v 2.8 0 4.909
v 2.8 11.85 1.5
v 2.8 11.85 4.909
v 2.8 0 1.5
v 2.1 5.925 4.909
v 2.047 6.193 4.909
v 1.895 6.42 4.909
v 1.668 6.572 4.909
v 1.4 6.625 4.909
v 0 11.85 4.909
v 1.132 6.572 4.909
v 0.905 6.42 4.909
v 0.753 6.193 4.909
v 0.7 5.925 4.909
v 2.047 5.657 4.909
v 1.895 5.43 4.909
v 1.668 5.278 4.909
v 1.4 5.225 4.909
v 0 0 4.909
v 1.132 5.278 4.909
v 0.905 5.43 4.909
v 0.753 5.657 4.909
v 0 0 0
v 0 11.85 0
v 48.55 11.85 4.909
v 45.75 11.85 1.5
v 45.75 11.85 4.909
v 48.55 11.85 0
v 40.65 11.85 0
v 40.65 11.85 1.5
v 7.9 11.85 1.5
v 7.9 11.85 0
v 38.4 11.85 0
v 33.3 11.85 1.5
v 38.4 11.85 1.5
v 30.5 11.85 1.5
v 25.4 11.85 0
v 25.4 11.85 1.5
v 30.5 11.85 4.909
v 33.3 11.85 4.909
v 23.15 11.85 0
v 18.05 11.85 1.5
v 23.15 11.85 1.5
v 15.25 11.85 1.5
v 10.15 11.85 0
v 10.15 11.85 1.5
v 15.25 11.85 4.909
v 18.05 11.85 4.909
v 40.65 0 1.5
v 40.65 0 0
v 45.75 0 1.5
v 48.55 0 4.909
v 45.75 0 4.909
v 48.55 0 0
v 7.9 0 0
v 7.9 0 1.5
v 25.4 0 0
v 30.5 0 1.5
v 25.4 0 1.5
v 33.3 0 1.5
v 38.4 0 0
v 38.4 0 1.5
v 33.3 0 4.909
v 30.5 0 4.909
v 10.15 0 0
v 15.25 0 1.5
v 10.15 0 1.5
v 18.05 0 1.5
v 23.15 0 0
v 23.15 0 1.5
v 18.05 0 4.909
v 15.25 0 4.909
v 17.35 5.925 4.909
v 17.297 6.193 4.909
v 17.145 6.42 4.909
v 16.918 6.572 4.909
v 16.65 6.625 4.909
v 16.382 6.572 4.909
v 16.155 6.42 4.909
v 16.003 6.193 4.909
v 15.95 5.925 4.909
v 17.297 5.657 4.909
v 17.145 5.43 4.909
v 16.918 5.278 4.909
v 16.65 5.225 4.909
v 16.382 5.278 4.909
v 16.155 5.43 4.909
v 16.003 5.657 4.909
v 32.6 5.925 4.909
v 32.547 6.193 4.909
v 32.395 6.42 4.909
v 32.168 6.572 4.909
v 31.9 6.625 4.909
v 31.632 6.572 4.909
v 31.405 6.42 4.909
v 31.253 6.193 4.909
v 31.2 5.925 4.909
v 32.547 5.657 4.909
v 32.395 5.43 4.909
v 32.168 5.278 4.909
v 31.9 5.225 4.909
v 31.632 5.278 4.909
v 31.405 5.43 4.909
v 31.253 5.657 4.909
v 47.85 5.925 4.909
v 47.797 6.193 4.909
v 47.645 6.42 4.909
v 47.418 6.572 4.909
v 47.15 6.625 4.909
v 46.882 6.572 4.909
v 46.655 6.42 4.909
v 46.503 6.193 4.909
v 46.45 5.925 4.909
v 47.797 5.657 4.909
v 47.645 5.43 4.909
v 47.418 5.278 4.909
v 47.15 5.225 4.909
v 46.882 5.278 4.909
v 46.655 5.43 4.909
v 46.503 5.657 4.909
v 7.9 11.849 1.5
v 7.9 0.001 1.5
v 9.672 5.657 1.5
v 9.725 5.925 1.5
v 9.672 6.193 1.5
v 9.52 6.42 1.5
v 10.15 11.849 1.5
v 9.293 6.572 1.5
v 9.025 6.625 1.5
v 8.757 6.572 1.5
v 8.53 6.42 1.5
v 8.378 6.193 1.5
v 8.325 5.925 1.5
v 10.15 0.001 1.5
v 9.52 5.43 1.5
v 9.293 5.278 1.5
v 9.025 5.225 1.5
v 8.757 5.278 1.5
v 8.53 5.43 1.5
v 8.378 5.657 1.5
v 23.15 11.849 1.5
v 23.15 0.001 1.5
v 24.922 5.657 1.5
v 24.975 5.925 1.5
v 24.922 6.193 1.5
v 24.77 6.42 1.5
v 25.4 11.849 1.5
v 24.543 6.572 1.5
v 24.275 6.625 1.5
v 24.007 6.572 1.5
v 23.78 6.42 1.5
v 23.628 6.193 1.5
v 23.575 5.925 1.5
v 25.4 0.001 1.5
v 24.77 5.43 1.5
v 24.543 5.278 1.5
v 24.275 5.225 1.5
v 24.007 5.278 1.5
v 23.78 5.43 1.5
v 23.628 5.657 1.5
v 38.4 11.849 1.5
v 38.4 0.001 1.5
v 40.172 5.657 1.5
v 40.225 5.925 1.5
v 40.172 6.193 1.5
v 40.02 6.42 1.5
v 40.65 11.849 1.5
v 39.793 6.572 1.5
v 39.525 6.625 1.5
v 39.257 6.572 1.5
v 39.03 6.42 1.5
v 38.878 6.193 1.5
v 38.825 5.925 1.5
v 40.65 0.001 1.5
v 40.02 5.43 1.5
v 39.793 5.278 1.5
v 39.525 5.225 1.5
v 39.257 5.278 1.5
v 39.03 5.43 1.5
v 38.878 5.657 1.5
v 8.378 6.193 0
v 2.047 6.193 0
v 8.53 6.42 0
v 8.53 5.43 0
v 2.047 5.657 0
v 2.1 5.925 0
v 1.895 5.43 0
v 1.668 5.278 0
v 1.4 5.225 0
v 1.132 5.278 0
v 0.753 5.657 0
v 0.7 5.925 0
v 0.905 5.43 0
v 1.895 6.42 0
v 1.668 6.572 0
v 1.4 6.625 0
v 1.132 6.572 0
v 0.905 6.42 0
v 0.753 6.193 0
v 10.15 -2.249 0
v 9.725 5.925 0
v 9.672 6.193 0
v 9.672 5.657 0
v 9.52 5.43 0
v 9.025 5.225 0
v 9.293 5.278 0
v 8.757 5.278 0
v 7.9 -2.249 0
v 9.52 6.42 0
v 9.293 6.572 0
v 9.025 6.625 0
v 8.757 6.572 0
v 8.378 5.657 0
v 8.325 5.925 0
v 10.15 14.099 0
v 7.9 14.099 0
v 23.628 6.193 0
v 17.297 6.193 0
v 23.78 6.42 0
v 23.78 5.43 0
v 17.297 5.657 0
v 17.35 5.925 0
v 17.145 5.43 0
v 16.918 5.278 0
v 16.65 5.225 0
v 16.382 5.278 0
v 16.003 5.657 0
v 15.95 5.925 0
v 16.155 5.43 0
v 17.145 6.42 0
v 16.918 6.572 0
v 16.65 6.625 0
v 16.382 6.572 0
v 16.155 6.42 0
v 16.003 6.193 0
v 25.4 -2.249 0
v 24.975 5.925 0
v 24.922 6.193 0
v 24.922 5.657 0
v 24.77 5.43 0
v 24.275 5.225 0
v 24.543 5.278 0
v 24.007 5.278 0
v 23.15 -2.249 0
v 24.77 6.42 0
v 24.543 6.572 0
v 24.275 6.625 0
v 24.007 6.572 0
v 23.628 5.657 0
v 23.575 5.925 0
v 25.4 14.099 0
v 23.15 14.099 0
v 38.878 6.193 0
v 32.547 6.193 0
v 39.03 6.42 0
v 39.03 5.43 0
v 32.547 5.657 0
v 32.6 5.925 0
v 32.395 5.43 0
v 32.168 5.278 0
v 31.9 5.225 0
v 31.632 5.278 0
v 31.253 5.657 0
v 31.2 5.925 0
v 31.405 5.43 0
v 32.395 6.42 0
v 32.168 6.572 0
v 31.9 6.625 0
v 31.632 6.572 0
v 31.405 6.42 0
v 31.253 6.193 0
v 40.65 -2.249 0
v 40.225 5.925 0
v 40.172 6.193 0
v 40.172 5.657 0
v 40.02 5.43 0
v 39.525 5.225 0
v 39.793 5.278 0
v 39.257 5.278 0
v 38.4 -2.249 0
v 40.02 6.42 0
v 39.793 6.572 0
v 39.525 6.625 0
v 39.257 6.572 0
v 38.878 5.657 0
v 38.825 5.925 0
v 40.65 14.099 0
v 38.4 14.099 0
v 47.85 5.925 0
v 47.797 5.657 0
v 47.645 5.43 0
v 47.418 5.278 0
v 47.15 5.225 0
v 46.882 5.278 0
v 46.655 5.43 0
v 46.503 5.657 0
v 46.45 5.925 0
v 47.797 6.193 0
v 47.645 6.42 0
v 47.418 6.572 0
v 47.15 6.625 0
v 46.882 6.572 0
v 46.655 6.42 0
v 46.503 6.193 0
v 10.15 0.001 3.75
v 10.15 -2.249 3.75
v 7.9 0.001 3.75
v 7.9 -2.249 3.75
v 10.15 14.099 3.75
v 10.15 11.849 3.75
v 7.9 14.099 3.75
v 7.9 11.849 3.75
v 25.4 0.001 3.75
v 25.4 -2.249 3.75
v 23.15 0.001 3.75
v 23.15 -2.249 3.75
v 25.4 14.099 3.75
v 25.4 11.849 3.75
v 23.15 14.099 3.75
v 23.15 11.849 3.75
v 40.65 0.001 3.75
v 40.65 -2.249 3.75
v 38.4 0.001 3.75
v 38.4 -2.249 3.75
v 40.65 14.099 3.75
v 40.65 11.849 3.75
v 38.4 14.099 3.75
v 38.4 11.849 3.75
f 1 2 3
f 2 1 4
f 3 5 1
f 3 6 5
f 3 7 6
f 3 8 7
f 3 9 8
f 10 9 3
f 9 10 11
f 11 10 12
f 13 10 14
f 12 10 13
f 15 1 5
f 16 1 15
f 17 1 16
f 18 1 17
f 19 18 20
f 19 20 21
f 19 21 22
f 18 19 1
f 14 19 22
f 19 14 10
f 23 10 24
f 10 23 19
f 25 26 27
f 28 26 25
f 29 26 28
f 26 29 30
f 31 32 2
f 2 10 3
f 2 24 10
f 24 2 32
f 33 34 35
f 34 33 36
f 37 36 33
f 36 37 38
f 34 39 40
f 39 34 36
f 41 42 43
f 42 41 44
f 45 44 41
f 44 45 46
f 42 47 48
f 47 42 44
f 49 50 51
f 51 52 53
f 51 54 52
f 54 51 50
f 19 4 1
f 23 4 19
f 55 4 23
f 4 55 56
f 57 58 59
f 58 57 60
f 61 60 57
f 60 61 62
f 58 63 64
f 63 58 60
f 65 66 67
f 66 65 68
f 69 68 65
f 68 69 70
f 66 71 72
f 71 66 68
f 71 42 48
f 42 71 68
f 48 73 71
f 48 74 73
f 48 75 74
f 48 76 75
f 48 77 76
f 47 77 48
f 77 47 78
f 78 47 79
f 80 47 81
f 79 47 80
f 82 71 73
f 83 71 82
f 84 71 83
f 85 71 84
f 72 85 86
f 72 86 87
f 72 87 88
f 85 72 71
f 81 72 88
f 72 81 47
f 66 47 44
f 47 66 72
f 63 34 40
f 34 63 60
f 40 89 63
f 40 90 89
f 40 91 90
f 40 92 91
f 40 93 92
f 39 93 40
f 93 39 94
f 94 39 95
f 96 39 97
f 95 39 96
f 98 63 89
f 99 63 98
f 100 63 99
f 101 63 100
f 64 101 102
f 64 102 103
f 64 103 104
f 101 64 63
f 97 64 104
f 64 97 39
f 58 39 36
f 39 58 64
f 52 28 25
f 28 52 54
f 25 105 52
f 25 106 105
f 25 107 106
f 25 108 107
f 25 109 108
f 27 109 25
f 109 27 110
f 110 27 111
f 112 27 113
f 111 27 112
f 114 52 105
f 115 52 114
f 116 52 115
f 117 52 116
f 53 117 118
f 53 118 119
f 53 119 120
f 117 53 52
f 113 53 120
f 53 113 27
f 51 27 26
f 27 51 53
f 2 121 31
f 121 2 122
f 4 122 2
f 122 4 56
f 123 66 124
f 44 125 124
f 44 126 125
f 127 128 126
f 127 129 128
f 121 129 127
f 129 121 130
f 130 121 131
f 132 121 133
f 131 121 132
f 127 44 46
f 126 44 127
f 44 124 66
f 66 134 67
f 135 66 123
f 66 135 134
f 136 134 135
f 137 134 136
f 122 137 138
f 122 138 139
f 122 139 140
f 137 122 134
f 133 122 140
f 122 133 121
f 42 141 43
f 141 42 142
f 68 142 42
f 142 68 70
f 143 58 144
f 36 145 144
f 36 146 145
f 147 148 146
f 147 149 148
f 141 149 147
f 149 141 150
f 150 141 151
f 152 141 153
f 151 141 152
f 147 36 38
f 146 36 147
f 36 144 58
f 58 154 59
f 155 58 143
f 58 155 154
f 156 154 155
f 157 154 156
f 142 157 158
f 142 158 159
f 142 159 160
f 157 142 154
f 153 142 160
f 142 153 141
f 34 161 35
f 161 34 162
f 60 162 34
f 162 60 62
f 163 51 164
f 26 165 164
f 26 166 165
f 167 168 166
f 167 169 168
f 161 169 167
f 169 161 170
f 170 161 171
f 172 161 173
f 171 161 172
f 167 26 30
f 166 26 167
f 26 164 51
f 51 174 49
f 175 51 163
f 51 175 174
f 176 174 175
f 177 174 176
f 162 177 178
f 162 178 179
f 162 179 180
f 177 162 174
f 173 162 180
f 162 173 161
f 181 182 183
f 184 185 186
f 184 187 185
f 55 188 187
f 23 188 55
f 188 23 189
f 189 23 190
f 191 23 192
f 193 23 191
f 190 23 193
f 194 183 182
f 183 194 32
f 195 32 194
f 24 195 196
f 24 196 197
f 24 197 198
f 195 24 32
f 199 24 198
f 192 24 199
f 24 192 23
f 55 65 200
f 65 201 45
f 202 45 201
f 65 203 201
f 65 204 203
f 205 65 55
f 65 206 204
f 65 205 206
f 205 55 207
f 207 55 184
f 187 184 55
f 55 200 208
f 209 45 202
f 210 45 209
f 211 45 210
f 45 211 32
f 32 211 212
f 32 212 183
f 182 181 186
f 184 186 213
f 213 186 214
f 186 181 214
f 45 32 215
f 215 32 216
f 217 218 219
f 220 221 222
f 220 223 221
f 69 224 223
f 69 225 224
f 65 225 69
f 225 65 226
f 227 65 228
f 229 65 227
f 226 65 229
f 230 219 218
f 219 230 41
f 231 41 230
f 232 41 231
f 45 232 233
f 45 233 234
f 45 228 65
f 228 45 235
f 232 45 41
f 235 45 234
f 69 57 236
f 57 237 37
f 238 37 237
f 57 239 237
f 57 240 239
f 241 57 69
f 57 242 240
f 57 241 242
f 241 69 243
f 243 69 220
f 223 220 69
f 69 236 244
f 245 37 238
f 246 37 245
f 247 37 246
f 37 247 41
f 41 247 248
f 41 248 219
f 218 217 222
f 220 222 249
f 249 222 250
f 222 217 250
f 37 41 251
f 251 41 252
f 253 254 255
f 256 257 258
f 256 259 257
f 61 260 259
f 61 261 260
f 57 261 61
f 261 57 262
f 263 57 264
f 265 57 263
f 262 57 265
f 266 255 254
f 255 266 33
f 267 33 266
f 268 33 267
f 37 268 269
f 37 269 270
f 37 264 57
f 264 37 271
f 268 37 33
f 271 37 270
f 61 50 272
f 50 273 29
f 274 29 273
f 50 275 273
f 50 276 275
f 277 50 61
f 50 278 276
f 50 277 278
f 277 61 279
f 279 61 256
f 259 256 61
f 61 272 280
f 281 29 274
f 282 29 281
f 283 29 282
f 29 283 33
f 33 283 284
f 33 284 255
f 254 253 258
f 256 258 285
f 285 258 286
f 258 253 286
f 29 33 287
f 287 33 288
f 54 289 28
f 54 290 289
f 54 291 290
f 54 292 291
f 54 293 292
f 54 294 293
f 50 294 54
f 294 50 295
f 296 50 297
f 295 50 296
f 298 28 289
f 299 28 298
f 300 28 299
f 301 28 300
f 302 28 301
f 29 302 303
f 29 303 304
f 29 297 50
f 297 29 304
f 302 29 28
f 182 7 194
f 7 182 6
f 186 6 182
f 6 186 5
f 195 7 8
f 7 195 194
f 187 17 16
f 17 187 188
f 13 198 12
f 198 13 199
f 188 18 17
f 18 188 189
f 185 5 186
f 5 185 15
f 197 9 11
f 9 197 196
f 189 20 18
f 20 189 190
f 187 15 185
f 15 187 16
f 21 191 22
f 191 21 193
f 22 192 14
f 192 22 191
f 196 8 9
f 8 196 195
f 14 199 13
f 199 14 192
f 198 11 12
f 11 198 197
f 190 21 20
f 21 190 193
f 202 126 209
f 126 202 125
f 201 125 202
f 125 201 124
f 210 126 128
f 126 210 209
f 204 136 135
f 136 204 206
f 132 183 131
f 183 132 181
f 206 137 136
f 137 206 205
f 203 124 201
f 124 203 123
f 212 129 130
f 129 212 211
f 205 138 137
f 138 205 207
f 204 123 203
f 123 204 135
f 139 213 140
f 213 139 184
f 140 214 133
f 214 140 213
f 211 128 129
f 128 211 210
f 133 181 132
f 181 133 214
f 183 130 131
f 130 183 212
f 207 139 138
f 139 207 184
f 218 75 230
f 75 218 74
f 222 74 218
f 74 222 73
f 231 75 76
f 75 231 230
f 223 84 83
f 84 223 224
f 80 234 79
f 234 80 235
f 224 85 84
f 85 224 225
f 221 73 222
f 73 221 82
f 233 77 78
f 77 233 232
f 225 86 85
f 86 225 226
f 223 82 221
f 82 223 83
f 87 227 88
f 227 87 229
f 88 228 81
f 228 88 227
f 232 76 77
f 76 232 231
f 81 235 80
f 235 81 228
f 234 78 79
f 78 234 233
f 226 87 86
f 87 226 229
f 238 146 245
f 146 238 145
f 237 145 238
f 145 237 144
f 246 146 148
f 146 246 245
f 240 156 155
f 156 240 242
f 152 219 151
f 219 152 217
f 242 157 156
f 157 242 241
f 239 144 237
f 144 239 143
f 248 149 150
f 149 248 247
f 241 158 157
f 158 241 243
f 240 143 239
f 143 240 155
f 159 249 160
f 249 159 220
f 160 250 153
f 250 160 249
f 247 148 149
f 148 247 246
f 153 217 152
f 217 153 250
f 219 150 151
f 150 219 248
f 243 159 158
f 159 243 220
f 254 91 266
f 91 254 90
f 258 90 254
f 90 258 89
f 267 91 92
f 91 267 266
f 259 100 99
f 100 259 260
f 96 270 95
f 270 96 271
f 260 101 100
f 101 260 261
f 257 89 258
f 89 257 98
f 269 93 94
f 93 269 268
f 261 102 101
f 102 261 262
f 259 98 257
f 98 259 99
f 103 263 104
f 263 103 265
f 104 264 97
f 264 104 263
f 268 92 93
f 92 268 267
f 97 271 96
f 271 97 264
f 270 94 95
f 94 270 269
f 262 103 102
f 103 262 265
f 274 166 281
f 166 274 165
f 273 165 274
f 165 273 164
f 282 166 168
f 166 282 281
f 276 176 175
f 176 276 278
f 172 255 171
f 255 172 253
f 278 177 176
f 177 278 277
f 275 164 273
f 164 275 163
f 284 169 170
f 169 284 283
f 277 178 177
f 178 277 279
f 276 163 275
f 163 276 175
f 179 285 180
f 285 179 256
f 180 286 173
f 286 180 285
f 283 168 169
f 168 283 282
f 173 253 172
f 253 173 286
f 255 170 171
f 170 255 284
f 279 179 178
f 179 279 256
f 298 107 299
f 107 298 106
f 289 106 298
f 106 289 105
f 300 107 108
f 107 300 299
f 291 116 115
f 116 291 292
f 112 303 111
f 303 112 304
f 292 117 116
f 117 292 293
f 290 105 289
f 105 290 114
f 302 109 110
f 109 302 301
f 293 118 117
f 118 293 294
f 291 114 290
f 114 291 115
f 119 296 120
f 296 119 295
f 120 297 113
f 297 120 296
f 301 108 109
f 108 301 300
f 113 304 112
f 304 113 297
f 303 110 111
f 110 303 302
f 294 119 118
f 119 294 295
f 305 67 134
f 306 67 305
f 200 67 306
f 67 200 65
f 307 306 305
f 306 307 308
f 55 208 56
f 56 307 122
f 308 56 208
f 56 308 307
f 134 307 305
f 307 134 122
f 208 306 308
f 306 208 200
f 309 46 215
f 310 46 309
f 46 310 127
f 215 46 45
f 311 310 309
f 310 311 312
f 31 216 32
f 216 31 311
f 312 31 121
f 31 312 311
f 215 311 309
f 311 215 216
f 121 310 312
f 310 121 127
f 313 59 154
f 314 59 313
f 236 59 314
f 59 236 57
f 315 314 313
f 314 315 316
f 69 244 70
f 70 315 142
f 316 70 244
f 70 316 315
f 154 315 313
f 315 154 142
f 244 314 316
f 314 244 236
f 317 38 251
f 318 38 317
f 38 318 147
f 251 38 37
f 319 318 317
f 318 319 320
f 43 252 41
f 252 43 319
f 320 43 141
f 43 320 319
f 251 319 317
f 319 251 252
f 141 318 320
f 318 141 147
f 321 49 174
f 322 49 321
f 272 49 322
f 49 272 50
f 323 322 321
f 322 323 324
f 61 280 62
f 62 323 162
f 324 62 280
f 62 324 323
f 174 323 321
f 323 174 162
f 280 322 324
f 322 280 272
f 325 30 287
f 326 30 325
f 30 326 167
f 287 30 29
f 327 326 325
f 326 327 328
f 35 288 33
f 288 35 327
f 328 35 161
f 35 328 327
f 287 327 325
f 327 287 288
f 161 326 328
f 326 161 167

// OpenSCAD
buttonWidth = 11.85;
spacing = 2.8;
screwSize = 1.4;
buttonThickness = 3.91;
buttonTensioning = 0.5;
tolerance = 0.3;
stripWidth1 = 11.85;
thickness = 1.5;
buttonCount = 3;
tabSize = 2.25;

module dummy() {}

stripWidth = stripWidth1+tolerance;

nudge = 0.001;

length = buttonCount * (buttonWidth+2*tolerance) + (1+buttonCount) * spacing;
echo(length);
module main() {
    cube([length,stripWidth1,thickness]);
    for (i=[0:buttonCount]) {
        x = (spacing+buttonWidth+2*tolerance)*i;
        translate([x,0,thickness-nudge]) cube([spacing,stripWidth1,buttonThickness-buttonTensioning]);
    }
}

render(convexity=2)
difference() {
    main();
    for (i=[0:buttonCount]) {
        x = (spacing+buttonWidth+2*tolerance)*i+spacing/2;
        translate([x,-tabSize+nudge,0])
            cube([tabSize,tabSize,tabSize,buttonThickness-buttonTensioning+tabSize]);
        translate([x,stripWidth1/2,-nudge]) cylinder(d=screwSize,h=2*nudge+buttonThickness+thickness,$fn=16);
        if (i<buttonCount) {
        translate([x+spacing/2+buttonWidth/2+tolerance,stripWidth1/2,-nudge]) cylinder(d=screwSize,h=2*nudge+buttonThickness+thickness,$fn=16);
        }
    }
}

for (i=[0:buttonCount-1]) {
    x = (spacing+buttonWidth+2*tolerance)*i+spacing/2+spacing/2+buttonWidth/2+tolerance-tabSize/2;
    translate([x,-tabSize+nudge,0]) cube([tabSize,tabSize,tabSize+thickness]);
    translate([x,stripWidth1-nudge,0]) cube([tabSize,tabSize,tabSize+thickness]);
}
